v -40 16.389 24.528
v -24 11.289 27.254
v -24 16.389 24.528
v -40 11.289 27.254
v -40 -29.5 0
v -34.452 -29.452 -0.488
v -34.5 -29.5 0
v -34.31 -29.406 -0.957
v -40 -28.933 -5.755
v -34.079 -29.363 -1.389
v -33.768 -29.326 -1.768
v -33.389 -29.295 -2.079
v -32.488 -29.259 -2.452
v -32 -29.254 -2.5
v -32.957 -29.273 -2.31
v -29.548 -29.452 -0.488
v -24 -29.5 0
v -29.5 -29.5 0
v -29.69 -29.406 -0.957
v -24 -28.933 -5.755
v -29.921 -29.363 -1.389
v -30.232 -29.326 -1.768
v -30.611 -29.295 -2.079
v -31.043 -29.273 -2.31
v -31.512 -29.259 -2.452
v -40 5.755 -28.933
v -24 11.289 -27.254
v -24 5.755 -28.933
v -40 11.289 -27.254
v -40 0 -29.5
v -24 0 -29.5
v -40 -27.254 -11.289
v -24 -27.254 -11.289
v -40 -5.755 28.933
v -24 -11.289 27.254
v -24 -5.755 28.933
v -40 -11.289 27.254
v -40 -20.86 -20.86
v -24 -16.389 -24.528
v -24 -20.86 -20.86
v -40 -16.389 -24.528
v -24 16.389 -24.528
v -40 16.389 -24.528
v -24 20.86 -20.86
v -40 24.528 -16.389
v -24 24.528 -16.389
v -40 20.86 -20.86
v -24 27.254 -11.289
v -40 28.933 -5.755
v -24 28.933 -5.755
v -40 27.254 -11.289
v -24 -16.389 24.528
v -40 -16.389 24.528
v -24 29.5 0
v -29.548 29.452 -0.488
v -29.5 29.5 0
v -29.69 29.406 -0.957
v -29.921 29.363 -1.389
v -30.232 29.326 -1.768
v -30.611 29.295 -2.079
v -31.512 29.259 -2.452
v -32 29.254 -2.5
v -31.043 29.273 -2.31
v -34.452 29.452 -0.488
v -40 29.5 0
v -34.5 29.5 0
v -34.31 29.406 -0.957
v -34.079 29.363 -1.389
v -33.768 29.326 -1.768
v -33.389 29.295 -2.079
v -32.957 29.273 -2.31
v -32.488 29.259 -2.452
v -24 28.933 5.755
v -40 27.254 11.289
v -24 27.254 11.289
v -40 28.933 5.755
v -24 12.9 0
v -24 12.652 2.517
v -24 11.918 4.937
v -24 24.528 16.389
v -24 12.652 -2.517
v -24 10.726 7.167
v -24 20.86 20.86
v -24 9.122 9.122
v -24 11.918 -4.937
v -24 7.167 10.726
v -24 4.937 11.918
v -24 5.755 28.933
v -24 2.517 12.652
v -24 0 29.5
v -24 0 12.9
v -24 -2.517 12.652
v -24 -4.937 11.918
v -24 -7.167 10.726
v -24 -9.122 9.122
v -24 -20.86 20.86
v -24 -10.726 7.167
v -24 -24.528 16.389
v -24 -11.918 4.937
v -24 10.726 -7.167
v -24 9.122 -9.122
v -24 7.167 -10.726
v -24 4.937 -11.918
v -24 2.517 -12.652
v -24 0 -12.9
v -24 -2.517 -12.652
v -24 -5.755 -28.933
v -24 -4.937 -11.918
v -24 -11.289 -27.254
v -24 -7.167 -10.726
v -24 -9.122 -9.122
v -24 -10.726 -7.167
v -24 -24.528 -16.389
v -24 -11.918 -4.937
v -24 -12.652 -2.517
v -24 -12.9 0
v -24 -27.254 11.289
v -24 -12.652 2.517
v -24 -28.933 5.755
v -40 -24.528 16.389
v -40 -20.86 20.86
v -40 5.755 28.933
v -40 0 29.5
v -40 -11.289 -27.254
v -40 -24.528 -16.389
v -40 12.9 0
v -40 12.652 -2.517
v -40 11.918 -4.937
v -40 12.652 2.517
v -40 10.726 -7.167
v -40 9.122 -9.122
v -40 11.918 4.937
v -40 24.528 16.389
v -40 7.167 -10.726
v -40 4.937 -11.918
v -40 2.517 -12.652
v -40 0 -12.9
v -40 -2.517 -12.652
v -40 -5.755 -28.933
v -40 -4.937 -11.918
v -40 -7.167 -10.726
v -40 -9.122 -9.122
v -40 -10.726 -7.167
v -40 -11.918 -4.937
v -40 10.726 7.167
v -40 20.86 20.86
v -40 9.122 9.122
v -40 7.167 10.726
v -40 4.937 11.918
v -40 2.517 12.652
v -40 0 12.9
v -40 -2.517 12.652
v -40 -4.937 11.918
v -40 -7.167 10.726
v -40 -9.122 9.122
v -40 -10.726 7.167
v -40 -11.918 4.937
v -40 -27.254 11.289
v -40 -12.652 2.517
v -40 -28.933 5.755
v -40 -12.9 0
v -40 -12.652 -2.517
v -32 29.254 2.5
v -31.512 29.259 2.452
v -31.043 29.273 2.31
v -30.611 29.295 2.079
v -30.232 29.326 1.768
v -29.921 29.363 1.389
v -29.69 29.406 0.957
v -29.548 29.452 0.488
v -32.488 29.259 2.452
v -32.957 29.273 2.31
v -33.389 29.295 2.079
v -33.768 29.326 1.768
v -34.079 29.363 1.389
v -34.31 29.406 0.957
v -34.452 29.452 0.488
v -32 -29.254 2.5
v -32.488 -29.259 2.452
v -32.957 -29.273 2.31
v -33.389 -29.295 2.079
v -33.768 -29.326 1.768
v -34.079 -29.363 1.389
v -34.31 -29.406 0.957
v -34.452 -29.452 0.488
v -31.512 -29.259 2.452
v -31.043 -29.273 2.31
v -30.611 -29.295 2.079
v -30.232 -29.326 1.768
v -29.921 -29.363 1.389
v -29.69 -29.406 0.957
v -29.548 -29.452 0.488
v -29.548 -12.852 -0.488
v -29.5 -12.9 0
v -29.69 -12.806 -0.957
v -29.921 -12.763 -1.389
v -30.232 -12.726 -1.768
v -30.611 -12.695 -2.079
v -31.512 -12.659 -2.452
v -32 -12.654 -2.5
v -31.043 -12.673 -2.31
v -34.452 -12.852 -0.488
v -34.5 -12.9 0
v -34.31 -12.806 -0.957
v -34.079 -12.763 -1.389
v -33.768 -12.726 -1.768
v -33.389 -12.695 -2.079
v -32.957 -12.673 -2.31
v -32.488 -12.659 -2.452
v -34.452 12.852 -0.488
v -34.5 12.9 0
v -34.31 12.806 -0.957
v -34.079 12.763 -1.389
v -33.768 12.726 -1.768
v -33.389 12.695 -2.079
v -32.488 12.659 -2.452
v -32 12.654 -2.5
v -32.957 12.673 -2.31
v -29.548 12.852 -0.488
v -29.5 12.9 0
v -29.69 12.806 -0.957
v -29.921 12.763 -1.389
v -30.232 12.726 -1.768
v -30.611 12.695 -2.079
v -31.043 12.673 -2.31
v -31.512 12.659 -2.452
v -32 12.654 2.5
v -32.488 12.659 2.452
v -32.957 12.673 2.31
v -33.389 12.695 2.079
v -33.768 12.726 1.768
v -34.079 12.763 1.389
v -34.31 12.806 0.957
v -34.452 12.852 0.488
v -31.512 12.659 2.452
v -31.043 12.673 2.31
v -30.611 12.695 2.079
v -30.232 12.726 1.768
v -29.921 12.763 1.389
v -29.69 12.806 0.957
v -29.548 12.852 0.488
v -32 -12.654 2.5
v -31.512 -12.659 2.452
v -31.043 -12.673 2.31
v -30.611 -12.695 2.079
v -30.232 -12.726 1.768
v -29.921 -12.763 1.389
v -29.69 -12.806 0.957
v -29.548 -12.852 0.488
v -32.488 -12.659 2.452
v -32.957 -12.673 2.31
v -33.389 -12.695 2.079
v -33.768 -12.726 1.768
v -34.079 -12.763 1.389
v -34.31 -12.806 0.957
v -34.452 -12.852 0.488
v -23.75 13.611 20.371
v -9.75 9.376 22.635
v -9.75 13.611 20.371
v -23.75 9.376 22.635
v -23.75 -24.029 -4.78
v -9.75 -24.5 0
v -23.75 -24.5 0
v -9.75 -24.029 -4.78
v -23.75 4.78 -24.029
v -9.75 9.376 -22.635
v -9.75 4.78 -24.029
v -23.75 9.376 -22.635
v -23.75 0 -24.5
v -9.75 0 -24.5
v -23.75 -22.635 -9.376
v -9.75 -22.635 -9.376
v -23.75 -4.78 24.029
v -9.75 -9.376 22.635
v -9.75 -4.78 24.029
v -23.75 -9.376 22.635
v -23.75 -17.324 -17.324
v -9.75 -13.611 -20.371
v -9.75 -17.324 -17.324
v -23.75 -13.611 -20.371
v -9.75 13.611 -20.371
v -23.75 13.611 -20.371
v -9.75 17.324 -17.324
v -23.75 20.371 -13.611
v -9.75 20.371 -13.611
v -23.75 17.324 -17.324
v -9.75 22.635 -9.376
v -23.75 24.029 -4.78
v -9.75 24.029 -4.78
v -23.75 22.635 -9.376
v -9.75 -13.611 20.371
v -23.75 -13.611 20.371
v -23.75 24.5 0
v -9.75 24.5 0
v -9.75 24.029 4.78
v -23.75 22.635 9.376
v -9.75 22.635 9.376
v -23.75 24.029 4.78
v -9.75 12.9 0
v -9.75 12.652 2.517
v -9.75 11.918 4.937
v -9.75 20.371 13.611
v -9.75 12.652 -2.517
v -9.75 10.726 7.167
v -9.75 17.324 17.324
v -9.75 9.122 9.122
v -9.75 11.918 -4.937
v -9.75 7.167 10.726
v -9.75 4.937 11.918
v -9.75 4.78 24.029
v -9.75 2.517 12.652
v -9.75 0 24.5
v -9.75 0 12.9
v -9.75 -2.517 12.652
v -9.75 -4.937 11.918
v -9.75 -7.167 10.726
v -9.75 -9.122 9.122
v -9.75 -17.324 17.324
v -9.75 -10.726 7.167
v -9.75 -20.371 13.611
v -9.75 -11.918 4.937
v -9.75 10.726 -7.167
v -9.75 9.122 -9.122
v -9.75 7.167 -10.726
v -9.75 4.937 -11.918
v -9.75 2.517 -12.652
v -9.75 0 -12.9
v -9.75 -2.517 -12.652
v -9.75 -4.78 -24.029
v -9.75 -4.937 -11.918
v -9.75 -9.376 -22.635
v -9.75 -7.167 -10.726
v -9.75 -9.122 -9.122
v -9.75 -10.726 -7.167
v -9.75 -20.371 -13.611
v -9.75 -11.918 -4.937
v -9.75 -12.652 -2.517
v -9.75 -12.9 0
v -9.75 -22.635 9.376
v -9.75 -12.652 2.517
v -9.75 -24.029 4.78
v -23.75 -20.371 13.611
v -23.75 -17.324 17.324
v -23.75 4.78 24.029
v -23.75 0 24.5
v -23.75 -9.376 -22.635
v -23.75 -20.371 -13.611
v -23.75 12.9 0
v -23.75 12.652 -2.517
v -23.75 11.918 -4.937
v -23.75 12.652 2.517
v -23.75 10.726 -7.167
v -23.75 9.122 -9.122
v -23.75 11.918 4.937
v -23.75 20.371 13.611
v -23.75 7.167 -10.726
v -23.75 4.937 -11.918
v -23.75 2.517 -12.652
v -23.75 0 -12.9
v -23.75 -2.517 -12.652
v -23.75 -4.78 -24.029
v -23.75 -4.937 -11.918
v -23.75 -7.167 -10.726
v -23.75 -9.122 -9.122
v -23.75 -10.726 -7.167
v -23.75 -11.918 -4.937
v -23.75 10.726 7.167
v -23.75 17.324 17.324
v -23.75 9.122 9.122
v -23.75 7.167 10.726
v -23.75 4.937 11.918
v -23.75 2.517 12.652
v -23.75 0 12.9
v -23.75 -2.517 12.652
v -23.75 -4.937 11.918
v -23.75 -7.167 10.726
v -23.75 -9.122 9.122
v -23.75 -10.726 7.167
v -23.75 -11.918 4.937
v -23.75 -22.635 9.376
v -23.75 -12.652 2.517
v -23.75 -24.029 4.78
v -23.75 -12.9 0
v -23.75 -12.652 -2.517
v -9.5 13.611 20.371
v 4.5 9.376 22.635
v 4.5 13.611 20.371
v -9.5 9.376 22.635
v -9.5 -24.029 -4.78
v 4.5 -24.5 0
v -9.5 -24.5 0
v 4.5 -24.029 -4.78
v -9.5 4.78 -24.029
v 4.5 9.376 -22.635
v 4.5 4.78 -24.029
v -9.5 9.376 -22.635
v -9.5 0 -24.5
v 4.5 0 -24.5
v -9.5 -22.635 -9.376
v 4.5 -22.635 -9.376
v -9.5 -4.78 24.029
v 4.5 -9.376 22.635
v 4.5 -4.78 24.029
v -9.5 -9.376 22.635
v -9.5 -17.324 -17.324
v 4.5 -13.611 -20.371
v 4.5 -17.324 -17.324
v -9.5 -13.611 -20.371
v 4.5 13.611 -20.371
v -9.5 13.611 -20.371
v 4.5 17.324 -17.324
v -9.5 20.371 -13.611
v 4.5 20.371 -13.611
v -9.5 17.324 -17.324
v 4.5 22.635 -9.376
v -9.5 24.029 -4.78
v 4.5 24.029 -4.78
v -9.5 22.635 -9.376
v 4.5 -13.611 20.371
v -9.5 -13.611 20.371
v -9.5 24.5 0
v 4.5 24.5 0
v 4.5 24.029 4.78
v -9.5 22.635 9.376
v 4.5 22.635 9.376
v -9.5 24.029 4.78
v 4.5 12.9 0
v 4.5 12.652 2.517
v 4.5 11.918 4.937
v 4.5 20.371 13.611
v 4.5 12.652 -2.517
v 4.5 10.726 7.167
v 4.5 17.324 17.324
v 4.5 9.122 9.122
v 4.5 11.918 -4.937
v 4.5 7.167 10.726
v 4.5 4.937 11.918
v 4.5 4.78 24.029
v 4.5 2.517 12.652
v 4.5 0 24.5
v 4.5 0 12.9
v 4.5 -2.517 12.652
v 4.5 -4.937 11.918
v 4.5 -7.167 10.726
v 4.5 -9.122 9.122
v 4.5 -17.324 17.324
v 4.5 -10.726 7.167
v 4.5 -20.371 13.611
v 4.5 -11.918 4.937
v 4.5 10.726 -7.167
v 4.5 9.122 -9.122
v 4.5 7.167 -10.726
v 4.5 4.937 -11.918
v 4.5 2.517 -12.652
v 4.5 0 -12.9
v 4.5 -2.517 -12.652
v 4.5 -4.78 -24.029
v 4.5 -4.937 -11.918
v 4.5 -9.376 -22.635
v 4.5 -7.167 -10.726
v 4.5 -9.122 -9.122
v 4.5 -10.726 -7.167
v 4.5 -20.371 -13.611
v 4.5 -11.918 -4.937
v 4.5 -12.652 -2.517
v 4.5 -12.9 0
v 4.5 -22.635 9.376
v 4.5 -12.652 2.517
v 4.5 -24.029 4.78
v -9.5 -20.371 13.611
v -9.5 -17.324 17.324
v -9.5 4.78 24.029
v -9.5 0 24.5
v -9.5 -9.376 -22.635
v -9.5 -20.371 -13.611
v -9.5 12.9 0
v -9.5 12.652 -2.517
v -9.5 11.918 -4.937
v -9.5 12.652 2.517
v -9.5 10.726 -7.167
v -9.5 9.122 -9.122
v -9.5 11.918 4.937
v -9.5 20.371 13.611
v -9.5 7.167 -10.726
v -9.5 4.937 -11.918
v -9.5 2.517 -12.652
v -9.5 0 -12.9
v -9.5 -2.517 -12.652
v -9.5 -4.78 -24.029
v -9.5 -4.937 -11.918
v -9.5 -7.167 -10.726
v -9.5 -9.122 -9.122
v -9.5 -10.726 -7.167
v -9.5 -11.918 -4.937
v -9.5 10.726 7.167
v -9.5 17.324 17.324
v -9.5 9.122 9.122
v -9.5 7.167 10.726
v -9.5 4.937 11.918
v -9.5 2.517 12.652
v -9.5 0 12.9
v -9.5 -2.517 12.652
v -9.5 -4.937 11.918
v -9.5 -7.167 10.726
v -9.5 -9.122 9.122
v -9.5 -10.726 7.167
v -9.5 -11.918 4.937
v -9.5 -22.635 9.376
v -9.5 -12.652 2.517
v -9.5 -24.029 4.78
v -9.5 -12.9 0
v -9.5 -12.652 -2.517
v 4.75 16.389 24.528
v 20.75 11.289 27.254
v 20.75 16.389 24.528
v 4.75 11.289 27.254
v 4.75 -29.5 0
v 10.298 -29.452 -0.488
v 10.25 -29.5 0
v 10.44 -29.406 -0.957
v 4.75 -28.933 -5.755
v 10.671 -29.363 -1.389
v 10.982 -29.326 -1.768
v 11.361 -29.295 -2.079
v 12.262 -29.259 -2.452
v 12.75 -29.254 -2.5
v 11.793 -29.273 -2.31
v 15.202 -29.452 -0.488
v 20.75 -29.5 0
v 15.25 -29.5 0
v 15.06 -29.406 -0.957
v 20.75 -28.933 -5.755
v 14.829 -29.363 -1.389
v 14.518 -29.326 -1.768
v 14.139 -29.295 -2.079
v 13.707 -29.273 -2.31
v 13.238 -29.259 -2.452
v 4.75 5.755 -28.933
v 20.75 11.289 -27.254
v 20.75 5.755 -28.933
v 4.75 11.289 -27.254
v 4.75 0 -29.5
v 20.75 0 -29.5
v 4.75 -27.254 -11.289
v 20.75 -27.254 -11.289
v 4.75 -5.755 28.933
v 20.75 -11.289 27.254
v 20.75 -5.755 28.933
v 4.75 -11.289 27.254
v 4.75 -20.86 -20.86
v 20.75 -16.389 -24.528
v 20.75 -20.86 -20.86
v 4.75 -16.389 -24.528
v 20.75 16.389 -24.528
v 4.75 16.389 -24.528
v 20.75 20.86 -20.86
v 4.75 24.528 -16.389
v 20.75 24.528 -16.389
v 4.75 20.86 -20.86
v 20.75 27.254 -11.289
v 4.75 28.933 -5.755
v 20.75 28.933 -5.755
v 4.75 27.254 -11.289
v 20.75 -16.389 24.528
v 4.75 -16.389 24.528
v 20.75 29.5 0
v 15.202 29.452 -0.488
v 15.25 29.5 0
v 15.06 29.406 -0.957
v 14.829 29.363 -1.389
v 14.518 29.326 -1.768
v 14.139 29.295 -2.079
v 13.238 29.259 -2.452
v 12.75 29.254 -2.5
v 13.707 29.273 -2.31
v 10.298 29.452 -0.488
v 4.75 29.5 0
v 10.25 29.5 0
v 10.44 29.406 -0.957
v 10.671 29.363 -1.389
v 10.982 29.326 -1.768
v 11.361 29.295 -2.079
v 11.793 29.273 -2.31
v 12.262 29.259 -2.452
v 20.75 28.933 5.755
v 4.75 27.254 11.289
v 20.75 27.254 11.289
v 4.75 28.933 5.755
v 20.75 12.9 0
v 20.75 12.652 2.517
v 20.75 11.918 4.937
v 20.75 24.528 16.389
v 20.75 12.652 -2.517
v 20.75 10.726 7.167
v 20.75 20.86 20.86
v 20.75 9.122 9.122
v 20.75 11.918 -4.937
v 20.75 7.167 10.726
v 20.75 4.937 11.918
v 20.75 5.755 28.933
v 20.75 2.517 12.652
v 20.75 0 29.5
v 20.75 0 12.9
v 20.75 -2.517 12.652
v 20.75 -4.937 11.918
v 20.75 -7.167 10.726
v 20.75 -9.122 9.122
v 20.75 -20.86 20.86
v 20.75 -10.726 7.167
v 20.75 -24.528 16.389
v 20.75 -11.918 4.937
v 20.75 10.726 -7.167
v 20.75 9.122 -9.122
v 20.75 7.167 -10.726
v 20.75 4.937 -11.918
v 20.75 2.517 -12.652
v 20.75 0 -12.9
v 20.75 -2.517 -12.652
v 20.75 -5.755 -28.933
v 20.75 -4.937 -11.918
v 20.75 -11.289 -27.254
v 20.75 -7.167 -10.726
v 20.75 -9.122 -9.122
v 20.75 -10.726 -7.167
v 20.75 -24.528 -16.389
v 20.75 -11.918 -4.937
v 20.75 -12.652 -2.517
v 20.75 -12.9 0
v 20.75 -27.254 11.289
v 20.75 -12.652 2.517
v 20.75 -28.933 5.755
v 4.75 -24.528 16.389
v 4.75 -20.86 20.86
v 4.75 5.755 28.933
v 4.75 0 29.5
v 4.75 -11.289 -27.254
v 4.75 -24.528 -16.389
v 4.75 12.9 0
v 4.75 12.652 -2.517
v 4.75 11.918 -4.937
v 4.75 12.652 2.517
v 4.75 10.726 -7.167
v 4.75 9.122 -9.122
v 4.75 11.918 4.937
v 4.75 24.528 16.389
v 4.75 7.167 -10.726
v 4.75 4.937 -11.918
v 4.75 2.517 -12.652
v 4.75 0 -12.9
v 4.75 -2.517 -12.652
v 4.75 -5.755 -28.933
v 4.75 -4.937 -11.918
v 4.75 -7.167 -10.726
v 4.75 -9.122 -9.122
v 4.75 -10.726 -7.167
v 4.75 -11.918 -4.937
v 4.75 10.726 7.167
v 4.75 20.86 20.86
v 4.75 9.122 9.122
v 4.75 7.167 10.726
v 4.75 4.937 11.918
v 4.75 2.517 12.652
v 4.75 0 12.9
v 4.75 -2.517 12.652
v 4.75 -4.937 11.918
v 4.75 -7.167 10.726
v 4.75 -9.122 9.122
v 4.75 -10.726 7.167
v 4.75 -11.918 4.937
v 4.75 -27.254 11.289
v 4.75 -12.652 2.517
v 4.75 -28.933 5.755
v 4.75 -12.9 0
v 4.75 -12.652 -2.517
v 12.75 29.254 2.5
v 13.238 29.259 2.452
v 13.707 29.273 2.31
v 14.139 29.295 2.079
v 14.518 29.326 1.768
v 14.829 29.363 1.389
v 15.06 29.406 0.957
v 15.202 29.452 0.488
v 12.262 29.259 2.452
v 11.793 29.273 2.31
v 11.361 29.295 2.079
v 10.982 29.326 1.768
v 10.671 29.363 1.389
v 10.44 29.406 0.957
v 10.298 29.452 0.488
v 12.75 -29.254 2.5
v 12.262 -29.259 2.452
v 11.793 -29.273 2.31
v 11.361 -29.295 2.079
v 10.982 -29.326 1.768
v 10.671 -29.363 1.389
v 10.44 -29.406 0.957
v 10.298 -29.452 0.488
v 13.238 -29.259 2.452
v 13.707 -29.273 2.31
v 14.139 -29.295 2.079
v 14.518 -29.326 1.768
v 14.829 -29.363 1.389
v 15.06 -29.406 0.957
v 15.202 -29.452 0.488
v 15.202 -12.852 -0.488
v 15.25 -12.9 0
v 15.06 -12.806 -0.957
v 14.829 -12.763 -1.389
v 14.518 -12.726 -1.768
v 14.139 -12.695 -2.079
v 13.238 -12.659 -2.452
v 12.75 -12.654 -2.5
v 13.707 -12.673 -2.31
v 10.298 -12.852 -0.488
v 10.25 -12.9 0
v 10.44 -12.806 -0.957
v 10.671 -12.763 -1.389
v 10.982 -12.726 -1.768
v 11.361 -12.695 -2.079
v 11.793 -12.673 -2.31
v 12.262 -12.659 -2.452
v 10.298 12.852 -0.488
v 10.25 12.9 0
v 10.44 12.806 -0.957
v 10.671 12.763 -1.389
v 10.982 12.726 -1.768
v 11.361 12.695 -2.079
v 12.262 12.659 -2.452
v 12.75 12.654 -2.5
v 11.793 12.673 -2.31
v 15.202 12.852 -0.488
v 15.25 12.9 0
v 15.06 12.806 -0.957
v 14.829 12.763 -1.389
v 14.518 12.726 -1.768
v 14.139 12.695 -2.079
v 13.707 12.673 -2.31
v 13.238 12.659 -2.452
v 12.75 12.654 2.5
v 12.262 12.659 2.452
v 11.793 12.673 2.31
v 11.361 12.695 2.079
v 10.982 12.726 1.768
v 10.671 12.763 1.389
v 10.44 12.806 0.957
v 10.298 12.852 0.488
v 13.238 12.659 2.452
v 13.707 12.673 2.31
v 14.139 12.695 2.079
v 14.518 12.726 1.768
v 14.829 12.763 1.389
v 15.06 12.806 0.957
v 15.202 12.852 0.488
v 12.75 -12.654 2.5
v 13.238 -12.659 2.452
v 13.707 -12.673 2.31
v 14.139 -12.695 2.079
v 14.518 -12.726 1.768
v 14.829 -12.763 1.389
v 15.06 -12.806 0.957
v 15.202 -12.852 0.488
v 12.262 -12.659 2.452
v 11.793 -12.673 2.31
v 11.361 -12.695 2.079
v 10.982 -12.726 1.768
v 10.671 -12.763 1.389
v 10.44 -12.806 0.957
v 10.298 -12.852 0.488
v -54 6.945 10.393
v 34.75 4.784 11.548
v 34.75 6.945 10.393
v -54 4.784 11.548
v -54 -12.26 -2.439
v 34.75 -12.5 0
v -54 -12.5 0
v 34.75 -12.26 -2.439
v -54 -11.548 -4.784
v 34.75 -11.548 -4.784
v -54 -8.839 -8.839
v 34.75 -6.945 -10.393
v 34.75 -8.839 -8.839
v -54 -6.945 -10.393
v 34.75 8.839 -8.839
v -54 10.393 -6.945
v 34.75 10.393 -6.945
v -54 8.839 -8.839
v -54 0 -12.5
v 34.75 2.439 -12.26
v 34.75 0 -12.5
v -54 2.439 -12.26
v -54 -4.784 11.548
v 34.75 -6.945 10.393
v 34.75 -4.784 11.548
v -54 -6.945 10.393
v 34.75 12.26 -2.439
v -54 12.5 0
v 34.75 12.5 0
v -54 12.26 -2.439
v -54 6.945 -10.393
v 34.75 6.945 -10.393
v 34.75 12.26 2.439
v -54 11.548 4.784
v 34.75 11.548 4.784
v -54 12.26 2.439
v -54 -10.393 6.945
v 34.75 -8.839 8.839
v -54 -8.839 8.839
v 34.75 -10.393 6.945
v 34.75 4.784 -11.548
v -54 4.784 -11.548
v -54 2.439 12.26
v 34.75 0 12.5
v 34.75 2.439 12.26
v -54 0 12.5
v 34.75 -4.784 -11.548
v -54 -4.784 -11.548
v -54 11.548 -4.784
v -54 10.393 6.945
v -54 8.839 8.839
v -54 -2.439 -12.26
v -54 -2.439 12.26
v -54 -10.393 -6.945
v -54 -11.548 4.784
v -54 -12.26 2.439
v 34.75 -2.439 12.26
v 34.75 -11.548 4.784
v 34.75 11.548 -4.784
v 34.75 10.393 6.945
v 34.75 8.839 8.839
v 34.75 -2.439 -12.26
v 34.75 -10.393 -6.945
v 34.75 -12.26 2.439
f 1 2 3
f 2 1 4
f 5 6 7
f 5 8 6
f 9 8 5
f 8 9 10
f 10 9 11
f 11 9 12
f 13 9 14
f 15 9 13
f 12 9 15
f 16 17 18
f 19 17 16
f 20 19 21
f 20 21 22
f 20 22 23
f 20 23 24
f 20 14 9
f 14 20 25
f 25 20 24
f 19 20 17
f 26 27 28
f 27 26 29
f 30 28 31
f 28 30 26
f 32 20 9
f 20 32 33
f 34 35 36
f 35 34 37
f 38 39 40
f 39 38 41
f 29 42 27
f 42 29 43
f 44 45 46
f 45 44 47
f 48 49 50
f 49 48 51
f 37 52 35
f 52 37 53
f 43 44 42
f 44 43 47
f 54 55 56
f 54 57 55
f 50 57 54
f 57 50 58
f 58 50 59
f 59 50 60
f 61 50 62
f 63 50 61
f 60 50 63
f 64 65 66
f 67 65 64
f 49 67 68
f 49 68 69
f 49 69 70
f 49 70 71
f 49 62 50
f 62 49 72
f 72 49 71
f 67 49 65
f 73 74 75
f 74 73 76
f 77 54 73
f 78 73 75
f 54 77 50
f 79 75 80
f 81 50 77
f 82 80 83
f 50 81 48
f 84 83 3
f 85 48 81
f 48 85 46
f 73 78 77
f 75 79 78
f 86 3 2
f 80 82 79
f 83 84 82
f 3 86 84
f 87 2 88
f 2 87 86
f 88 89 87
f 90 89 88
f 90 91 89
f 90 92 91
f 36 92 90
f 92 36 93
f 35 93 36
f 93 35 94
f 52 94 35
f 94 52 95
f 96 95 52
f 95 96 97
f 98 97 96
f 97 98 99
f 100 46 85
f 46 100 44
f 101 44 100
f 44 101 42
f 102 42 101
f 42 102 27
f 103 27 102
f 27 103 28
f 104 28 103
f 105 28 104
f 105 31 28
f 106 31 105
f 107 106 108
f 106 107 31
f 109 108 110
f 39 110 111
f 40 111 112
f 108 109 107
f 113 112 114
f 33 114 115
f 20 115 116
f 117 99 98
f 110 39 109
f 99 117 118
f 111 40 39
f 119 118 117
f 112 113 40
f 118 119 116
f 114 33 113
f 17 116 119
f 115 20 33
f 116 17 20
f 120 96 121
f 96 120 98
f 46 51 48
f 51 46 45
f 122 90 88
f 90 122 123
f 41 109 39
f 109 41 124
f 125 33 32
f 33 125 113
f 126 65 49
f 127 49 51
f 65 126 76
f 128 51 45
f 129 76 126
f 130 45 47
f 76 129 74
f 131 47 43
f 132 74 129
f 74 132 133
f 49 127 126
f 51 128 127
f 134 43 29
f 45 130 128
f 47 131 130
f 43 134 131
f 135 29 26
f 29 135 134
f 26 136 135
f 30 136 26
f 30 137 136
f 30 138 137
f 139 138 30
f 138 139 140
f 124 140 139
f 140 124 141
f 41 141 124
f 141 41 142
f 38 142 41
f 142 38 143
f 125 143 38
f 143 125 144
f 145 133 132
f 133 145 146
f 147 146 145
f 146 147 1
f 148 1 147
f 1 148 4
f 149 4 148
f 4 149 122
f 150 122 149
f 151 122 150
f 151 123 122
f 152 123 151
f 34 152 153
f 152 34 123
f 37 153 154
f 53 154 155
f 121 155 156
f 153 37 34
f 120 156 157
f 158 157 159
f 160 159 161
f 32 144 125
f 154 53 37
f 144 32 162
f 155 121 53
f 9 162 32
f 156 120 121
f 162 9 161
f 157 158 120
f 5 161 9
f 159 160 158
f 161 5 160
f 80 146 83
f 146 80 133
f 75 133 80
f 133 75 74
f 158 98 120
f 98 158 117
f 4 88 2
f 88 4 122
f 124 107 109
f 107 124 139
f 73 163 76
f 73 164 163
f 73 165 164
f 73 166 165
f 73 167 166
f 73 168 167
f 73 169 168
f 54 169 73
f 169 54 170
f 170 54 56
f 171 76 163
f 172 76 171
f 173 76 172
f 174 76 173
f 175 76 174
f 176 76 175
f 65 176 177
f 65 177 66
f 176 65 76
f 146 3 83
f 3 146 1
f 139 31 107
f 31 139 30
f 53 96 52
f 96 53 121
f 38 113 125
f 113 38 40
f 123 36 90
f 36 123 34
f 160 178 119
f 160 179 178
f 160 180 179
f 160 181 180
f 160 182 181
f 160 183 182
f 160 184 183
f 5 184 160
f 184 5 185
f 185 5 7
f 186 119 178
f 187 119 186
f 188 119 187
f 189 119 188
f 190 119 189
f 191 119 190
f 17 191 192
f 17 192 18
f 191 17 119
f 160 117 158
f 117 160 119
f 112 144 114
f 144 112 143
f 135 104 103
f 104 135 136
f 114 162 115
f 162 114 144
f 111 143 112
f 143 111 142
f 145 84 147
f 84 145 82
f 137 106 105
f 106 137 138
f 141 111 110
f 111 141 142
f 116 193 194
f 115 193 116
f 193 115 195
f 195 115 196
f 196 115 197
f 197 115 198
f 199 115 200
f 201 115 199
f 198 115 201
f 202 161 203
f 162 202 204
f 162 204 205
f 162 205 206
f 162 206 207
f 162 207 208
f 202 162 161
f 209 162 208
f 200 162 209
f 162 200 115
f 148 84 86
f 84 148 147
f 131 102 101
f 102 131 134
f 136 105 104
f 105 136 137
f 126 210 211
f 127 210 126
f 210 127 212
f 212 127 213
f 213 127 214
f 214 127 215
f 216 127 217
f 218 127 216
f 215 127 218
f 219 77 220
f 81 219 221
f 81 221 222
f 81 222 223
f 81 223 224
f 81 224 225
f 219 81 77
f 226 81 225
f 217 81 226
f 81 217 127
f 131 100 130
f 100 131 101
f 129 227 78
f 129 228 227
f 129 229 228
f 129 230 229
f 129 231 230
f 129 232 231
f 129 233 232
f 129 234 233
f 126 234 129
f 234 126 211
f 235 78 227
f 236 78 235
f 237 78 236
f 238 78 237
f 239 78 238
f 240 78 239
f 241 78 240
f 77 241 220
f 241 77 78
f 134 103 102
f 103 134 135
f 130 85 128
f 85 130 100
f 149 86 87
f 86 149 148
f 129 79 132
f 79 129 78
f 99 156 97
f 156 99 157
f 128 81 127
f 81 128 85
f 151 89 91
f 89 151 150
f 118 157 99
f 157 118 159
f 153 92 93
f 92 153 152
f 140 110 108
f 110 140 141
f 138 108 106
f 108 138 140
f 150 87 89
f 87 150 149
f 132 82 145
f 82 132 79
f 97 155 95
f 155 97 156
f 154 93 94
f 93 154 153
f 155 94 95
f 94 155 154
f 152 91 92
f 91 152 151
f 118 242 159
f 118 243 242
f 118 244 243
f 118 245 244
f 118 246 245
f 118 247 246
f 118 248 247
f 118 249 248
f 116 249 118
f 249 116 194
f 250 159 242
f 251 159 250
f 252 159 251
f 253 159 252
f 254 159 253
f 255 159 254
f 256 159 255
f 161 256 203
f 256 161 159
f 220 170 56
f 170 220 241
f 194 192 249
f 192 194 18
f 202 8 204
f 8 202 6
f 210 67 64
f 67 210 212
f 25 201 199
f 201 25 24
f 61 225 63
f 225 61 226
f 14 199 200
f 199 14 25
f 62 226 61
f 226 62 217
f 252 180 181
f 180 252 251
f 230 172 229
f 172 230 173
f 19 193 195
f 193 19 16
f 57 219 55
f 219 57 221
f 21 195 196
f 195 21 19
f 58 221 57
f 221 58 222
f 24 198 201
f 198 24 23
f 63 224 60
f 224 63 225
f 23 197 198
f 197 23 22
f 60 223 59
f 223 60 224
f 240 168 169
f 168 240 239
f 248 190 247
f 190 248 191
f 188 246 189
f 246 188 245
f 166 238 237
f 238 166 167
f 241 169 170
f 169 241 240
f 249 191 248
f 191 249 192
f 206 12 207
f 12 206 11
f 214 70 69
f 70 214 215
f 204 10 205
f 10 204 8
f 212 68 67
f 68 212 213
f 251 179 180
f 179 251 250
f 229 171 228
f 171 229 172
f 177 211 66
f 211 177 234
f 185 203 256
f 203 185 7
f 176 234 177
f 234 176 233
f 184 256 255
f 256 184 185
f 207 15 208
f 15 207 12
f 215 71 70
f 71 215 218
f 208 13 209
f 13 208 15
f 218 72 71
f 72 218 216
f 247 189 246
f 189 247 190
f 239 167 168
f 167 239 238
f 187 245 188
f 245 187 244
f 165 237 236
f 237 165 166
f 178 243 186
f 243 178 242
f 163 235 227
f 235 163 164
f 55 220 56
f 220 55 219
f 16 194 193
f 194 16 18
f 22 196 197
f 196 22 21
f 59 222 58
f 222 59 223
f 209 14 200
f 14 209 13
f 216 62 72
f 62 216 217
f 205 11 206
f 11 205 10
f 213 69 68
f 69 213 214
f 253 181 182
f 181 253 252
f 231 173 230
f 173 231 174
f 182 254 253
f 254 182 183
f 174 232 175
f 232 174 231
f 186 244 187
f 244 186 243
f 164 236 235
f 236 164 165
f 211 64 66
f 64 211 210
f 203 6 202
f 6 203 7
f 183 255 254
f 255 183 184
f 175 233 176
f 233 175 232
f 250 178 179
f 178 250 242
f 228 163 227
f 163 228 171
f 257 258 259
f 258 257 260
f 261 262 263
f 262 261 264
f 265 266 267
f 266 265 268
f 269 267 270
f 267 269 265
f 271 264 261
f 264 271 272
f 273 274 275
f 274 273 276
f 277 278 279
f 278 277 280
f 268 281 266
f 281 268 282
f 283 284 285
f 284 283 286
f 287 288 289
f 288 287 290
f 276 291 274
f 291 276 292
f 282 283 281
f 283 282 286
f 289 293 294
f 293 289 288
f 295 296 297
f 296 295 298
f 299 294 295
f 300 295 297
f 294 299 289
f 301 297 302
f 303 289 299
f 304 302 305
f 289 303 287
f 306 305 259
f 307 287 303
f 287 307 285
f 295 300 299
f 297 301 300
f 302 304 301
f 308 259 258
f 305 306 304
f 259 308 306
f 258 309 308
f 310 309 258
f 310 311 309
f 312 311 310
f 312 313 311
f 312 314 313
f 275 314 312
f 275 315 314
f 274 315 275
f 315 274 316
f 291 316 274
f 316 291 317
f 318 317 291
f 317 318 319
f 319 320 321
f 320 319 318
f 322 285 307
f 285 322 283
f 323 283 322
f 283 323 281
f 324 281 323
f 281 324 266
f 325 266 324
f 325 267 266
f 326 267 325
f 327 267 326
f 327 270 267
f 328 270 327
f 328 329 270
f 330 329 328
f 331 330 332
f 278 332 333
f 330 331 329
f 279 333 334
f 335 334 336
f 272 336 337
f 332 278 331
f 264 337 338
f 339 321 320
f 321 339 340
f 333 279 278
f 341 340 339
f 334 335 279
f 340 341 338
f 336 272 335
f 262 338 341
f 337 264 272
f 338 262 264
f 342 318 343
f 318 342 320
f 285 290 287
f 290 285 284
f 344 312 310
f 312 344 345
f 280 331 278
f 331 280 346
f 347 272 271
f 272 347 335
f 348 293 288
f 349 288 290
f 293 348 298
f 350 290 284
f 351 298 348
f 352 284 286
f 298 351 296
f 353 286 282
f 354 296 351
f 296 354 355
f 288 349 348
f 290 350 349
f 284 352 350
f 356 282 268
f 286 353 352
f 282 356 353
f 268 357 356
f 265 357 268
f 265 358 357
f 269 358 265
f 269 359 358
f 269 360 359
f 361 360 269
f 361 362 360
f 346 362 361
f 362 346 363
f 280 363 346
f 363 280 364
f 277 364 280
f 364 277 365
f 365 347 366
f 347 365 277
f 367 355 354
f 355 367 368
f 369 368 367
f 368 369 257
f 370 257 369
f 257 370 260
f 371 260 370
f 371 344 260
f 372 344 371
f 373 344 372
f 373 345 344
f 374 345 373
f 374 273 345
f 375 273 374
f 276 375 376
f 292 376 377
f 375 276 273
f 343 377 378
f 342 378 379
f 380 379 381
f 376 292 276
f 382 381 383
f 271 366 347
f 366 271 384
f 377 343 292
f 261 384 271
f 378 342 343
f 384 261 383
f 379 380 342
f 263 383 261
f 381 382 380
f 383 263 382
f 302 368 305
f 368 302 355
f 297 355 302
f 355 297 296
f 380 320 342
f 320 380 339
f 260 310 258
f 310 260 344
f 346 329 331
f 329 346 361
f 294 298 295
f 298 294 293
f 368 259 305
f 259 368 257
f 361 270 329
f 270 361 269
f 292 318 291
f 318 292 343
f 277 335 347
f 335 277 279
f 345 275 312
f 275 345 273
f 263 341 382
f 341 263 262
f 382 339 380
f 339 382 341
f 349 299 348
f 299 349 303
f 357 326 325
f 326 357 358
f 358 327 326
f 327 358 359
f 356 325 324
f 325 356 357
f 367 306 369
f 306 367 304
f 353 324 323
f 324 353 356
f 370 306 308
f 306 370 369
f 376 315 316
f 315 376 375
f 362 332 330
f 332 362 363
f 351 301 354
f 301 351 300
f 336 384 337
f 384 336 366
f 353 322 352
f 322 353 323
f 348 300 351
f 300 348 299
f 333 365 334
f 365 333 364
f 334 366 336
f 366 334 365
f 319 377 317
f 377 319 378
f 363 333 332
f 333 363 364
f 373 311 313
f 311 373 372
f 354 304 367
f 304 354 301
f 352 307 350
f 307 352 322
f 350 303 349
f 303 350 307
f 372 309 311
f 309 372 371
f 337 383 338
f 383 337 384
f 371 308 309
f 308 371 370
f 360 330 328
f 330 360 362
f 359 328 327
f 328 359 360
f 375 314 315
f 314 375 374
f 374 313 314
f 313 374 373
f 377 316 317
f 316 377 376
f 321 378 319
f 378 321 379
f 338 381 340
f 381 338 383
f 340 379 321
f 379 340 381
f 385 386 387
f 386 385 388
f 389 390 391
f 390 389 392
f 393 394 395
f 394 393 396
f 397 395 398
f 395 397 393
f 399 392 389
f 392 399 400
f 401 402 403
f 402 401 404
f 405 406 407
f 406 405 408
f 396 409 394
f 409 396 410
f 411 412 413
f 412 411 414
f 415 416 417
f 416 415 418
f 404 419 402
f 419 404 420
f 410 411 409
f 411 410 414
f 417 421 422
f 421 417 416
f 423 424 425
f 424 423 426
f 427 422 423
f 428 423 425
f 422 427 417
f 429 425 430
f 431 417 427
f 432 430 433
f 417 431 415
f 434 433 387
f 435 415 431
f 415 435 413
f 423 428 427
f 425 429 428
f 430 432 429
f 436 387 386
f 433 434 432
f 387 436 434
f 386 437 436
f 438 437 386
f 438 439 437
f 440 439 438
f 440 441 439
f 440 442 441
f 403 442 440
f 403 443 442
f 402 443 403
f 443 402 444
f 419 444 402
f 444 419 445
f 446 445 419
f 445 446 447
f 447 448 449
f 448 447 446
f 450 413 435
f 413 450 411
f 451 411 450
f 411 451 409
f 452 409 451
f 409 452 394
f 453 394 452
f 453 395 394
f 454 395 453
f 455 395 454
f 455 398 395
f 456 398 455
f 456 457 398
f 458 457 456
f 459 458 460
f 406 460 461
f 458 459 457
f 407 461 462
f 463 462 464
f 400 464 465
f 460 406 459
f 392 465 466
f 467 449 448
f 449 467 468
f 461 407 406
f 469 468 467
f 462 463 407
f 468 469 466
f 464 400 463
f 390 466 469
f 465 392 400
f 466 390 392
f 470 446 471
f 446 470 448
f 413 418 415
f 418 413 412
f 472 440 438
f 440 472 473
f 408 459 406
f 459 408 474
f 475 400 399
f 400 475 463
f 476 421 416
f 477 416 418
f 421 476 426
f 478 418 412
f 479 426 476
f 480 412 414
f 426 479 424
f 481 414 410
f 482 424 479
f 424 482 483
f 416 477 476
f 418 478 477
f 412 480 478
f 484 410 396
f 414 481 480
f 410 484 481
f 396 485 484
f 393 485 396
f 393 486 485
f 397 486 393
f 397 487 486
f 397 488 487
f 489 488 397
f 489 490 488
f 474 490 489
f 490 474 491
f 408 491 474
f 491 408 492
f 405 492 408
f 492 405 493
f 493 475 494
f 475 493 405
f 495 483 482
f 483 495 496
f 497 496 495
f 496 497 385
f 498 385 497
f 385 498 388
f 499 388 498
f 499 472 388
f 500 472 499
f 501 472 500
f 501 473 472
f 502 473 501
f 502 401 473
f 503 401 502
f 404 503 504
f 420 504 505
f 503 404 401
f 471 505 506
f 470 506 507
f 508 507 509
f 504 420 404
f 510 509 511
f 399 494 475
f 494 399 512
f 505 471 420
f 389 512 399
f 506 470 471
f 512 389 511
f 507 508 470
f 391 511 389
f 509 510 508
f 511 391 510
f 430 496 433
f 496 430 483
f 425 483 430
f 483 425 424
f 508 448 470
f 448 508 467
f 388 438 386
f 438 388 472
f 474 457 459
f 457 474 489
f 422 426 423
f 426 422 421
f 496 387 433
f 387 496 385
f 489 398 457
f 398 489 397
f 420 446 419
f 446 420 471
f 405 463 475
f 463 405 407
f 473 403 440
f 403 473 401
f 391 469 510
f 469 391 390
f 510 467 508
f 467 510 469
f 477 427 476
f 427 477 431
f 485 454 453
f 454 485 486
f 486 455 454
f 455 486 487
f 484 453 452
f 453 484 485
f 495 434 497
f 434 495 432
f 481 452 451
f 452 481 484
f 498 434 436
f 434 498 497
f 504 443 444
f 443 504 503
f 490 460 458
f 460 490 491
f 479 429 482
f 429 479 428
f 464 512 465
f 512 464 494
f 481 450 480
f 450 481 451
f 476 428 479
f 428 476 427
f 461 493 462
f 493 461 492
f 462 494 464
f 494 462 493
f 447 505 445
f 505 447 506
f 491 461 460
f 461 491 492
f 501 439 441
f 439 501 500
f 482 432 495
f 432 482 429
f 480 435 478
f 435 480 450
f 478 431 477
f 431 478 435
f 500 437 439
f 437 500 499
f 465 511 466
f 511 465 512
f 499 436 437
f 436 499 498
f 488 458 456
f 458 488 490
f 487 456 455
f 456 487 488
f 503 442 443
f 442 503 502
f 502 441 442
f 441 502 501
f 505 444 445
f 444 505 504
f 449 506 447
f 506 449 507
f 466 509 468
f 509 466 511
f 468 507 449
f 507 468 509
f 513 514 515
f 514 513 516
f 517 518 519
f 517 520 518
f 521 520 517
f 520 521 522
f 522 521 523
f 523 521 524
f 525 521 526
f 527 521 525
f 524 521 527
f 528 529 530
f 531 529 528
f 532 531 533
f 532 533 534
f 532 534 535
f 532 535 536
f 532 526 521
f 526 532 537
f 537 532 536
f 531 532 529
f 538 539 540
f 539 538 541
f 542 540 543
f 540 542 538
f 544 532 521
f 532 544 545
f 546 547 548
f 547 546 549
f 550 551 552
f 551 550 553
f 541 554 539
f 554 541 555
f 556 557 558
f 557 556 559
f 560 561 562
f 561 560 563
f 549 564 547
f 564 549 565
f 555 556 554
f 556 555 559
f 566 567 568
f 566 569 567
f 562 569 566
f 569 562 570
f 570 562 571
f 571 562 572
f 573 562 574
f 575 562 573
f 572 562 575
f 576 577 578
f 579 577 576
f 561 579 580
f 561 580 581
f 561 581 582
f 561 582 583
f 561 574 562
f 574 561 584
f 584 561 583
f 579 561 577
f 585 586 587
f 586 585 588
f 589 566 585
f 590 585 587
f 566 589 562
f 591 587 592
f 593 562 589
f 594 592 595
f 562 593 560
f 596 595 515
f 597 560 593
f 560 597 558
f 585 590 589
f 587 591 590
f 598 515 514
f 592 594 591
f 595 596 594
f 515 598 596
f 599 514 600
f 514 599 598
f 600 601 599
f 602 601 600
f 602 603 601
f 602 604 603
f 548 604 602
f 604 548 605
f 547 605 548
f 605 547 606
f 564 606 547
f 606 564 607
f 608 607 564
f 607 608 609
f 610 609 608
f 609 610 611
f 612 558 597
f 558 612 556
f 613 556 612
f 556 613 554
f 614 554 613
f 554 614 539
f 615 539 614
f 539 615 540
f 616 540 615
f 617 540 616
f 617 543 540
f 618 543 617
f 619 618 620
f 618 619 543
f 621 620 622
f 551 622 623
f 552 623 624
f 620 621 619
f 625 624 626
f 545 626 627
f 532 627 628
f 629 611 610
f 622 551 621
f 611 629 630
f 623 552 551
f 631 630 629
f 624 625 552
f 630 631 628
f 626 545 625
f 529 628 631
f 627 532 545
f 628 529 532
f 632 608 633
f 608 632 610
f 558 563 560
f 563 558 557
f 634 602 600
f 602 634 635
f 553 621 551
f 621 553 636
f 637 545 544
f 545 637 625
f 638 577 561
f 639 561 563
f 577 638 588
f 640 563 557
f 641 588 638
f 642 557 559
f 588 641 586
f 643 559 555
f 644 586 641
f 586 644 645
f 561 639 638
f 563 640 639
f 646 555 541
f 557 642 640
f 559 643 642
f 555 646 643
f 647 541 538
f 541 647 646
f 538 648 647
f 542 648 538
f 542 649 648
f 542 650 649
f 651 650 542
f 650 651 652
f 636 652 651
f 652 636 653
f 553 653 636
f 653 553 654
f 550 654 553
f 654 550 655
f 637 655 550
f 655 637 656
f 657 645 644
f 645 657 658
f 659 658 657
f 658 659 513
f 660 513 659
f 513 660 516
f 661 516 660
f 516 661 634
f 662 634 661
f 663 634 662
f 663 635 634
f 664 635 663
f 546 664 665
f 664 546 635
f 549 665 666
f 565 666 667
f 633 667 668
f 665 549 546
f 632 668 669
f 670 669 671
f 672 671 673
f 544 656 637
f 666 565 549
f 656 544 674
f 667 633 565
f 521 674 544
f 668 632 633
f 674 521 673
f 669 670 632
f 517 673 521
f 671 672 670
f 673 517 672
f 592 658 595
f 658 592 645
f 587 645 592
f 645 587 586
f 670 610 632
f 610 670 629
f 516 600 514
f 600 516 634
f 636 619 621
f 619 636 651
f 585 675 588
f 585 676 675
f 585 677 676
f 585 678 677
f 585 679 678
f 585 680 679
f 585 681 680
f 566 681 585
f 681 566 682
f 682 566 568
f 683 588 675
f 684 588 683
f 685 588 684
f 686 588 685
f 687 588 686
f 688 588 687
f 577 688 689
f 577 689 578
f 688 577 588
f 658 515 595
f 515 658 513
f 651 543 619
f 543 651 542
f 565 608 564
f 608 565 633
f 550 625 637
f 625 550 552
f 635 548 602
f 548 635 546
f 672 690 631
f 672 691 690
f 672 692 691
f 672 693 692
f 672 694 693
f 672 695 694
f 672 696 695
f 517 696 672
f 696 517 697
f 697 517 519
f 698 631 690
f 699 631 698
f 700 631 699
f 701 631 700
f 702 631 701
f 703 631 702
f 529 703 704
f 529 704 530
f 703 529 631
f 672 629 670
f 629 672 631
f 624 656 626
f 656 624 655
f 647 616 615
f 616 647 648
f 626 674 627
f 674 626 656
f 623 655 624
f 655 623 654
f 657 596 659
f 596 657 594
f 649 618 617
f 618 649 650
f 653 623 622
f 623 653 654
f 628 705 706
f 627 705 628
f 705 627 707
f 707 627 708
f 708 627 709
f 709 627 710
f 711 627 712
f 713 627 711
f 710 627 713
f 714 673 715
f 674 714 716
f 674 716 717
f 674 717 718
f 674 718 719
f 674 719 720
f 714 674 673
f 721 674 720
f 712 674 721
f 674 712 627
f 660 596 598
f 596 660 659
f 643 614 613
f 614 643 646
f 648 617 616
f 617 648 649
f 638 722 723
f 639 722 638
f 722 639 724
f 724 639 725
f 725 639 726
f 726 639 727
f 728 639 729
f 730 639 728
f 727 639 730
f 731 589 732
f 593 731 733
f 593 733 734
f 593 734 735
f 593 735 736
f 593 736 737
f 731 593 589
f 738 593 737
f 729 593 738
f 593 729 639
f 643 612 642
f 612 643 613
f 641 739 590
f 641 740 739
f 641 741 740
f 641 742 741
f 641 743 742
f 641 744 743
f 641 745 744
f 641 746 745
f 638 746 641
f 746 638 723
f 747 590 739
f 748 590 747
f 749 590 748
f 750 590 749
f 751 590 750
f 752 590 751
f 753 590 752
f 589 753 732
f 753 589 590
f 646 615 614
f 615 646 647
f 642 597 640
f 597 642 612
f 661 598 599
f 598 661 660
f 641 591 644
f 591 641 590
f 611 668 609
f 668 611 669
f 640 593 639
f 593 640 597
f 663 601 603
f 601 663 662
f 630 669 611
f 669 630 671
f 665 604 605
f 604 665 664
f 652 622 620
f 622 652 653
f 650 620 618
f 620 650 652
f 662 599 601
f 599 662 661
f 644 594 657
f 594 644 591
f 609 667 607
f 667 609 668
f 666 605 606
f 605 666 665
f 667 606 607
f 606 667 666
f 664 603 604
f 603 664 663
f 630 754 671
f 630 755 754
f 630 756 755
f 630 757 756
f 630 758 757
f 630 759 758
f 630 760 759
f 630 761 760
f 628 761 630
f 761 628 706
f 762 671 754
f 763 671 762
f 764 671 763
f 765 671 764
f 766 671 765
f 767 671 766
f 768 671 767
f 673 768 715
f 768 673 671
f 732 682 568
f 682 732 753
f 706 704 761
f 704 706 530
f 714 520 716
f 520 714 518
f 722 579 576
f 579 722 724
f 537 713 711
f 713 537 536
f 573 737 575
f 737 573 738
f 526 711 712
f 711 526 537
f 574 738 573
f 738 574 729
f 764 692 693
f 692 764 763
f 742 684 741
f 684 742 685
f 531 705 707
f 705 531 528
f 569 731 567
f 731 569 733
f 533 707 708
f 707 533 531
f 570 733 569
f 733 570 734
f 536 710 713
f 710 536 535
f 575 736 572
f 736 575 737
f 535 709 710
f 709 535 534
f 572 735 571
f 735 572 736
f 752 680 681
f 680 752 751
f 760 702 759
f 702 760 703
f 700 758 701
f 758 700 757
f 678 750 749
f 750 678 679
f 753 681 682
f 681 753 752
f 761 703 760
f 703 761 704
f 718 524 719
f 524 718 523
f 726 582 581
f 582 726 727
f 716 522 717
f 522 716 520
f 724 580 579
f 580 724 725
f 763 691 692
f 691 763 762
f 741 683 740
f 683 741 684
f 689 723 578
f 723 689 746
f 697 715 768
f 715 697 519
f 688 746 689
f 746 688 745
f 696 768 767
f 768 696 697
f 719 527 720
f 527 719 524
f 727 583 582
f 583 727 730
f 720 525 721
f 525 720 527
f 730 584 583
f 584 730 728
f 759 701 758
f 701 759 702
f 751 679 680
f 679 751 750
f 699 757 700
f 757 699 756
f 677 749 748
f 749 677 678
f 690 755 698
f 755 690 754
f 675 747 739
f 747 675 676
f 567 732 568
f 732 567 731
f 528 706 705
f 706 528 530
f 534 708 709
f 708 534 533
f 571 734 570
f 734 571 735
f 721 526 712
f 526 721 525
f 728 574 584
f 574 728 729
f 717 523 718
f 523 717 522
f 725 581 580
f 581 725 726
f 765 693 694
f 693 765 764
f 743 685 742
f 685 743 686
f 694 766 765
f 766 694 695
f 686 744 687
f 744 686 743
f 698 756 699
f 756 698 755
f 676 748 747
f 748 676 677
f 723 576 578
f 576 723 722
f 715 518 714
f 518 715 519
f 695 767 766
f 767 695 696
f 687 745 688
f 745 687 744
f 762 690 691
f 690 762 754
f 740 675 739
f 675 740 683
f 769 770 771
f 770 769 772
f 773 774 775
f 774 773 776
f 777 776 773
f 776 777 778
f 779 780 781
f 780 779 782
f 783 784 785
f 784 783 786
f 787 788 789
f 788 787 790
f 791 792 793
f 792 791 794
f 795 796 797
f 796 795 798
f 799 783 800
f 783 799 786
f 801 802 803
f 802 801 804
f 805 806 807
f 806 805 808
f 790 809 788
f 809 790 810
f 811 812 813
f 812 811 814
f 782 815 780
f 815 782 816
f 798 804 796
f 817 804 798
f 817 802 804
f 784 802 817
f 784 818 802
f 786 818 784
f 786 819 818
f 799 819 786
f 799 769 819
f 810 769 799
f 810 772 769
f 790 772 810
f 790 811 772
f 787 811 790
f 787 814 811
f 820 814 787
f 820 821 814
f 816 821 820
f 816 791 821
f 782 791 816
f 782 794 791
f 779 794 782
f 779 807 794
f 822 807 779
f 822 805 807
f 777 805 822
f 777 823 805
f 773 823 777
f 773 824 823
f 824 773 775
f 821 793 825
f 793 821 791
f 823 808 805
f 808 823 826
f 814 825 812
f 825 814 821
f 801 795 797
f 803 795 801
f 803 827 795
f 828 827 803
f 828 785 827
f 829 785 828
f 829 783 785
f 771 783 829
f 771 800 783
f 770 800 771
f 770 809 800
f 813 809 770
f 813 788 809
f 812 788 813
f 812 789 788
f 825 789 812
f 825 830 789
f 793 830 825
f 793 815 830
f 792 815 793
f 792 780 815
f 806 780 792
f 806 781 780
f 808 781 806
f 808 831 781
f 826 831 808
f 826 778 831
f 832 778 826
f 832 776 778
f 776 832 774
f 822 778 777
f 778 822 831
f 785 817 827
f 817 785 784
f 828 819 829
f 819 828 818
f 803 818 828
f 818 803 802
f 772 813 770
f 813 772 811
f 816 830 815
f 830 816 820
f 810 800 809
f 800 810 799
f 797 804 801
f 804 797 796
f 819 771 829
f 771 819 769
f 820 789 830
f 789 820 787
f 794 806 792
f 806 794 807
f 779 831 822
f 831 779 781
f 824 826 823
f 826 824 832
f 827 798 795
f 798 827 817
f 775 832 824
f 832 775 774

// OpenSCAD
$fn = 32;

// ------------------------------------------------------------------------
// Shaft with rings and collars: d25 shaft, 4 rings
// Every part is its own module, assembly() places them once.
// ------------------------------------------------------------------------

// --- part 1 ---
module shaft() {
  translate([0, 0, -44.375]) cylinder(h = 88.75, d = 25);
}

// --- part 2 ---
module collar_a() {
  difference() {
    cylinder(h = 16, d = 59);
    translate([0, 0, -1]) cylinder(h = 18, d = 25.8);
    translate([0, 0, 8]) rotate([90, 0, 0]) cylinder(h = 61, d = 5, center = true);
  }
}

// --- part 3 ---
module spacer_a() {
  difference() {
      translate([0, 0, 0]) cylinder(h = 14, d = 49);
      translate([0, 0, -1]) cylinder(h = 16, d = 25.8);
    }
}

// --- part 4 ---
module spacer_b() {
  difference() {
      translate([0, 0, 0]) cylinder(h = 14, d = 49);
      translate([0, 0, -1]) cylinder(h = 16, d = 25.8);
    }
}

// --- part 5 ---
module collar_b() {
  difference() {
    cylinder(h = 16, d = 59);
    translate([0, 0, -1]) cylinder(h = 18, d = 25.8);
    translate([0, 0, 8]) rotate([90, 0, 0]) cylinder(h = 61, d = 5, center = true);
  }
}

// --- assembly ---
module assembly() {
  translate([-9.625, 0, 0]) rotate([0, 90, 0]) shaft();
  translate([-40, 0, 0]) rotate([0, 90, 0]) collar_a();
  translate([-23.75, 0, 0]) rotate([0, 90, 0]) spacer_a();
  translate([-9.5, 0, 0]) rotate([0, 90, 0]) spacer_b();
  translate([4.75, 0, 0]) rotate([0, 90, 0]) collar_b();
}

assembly();
